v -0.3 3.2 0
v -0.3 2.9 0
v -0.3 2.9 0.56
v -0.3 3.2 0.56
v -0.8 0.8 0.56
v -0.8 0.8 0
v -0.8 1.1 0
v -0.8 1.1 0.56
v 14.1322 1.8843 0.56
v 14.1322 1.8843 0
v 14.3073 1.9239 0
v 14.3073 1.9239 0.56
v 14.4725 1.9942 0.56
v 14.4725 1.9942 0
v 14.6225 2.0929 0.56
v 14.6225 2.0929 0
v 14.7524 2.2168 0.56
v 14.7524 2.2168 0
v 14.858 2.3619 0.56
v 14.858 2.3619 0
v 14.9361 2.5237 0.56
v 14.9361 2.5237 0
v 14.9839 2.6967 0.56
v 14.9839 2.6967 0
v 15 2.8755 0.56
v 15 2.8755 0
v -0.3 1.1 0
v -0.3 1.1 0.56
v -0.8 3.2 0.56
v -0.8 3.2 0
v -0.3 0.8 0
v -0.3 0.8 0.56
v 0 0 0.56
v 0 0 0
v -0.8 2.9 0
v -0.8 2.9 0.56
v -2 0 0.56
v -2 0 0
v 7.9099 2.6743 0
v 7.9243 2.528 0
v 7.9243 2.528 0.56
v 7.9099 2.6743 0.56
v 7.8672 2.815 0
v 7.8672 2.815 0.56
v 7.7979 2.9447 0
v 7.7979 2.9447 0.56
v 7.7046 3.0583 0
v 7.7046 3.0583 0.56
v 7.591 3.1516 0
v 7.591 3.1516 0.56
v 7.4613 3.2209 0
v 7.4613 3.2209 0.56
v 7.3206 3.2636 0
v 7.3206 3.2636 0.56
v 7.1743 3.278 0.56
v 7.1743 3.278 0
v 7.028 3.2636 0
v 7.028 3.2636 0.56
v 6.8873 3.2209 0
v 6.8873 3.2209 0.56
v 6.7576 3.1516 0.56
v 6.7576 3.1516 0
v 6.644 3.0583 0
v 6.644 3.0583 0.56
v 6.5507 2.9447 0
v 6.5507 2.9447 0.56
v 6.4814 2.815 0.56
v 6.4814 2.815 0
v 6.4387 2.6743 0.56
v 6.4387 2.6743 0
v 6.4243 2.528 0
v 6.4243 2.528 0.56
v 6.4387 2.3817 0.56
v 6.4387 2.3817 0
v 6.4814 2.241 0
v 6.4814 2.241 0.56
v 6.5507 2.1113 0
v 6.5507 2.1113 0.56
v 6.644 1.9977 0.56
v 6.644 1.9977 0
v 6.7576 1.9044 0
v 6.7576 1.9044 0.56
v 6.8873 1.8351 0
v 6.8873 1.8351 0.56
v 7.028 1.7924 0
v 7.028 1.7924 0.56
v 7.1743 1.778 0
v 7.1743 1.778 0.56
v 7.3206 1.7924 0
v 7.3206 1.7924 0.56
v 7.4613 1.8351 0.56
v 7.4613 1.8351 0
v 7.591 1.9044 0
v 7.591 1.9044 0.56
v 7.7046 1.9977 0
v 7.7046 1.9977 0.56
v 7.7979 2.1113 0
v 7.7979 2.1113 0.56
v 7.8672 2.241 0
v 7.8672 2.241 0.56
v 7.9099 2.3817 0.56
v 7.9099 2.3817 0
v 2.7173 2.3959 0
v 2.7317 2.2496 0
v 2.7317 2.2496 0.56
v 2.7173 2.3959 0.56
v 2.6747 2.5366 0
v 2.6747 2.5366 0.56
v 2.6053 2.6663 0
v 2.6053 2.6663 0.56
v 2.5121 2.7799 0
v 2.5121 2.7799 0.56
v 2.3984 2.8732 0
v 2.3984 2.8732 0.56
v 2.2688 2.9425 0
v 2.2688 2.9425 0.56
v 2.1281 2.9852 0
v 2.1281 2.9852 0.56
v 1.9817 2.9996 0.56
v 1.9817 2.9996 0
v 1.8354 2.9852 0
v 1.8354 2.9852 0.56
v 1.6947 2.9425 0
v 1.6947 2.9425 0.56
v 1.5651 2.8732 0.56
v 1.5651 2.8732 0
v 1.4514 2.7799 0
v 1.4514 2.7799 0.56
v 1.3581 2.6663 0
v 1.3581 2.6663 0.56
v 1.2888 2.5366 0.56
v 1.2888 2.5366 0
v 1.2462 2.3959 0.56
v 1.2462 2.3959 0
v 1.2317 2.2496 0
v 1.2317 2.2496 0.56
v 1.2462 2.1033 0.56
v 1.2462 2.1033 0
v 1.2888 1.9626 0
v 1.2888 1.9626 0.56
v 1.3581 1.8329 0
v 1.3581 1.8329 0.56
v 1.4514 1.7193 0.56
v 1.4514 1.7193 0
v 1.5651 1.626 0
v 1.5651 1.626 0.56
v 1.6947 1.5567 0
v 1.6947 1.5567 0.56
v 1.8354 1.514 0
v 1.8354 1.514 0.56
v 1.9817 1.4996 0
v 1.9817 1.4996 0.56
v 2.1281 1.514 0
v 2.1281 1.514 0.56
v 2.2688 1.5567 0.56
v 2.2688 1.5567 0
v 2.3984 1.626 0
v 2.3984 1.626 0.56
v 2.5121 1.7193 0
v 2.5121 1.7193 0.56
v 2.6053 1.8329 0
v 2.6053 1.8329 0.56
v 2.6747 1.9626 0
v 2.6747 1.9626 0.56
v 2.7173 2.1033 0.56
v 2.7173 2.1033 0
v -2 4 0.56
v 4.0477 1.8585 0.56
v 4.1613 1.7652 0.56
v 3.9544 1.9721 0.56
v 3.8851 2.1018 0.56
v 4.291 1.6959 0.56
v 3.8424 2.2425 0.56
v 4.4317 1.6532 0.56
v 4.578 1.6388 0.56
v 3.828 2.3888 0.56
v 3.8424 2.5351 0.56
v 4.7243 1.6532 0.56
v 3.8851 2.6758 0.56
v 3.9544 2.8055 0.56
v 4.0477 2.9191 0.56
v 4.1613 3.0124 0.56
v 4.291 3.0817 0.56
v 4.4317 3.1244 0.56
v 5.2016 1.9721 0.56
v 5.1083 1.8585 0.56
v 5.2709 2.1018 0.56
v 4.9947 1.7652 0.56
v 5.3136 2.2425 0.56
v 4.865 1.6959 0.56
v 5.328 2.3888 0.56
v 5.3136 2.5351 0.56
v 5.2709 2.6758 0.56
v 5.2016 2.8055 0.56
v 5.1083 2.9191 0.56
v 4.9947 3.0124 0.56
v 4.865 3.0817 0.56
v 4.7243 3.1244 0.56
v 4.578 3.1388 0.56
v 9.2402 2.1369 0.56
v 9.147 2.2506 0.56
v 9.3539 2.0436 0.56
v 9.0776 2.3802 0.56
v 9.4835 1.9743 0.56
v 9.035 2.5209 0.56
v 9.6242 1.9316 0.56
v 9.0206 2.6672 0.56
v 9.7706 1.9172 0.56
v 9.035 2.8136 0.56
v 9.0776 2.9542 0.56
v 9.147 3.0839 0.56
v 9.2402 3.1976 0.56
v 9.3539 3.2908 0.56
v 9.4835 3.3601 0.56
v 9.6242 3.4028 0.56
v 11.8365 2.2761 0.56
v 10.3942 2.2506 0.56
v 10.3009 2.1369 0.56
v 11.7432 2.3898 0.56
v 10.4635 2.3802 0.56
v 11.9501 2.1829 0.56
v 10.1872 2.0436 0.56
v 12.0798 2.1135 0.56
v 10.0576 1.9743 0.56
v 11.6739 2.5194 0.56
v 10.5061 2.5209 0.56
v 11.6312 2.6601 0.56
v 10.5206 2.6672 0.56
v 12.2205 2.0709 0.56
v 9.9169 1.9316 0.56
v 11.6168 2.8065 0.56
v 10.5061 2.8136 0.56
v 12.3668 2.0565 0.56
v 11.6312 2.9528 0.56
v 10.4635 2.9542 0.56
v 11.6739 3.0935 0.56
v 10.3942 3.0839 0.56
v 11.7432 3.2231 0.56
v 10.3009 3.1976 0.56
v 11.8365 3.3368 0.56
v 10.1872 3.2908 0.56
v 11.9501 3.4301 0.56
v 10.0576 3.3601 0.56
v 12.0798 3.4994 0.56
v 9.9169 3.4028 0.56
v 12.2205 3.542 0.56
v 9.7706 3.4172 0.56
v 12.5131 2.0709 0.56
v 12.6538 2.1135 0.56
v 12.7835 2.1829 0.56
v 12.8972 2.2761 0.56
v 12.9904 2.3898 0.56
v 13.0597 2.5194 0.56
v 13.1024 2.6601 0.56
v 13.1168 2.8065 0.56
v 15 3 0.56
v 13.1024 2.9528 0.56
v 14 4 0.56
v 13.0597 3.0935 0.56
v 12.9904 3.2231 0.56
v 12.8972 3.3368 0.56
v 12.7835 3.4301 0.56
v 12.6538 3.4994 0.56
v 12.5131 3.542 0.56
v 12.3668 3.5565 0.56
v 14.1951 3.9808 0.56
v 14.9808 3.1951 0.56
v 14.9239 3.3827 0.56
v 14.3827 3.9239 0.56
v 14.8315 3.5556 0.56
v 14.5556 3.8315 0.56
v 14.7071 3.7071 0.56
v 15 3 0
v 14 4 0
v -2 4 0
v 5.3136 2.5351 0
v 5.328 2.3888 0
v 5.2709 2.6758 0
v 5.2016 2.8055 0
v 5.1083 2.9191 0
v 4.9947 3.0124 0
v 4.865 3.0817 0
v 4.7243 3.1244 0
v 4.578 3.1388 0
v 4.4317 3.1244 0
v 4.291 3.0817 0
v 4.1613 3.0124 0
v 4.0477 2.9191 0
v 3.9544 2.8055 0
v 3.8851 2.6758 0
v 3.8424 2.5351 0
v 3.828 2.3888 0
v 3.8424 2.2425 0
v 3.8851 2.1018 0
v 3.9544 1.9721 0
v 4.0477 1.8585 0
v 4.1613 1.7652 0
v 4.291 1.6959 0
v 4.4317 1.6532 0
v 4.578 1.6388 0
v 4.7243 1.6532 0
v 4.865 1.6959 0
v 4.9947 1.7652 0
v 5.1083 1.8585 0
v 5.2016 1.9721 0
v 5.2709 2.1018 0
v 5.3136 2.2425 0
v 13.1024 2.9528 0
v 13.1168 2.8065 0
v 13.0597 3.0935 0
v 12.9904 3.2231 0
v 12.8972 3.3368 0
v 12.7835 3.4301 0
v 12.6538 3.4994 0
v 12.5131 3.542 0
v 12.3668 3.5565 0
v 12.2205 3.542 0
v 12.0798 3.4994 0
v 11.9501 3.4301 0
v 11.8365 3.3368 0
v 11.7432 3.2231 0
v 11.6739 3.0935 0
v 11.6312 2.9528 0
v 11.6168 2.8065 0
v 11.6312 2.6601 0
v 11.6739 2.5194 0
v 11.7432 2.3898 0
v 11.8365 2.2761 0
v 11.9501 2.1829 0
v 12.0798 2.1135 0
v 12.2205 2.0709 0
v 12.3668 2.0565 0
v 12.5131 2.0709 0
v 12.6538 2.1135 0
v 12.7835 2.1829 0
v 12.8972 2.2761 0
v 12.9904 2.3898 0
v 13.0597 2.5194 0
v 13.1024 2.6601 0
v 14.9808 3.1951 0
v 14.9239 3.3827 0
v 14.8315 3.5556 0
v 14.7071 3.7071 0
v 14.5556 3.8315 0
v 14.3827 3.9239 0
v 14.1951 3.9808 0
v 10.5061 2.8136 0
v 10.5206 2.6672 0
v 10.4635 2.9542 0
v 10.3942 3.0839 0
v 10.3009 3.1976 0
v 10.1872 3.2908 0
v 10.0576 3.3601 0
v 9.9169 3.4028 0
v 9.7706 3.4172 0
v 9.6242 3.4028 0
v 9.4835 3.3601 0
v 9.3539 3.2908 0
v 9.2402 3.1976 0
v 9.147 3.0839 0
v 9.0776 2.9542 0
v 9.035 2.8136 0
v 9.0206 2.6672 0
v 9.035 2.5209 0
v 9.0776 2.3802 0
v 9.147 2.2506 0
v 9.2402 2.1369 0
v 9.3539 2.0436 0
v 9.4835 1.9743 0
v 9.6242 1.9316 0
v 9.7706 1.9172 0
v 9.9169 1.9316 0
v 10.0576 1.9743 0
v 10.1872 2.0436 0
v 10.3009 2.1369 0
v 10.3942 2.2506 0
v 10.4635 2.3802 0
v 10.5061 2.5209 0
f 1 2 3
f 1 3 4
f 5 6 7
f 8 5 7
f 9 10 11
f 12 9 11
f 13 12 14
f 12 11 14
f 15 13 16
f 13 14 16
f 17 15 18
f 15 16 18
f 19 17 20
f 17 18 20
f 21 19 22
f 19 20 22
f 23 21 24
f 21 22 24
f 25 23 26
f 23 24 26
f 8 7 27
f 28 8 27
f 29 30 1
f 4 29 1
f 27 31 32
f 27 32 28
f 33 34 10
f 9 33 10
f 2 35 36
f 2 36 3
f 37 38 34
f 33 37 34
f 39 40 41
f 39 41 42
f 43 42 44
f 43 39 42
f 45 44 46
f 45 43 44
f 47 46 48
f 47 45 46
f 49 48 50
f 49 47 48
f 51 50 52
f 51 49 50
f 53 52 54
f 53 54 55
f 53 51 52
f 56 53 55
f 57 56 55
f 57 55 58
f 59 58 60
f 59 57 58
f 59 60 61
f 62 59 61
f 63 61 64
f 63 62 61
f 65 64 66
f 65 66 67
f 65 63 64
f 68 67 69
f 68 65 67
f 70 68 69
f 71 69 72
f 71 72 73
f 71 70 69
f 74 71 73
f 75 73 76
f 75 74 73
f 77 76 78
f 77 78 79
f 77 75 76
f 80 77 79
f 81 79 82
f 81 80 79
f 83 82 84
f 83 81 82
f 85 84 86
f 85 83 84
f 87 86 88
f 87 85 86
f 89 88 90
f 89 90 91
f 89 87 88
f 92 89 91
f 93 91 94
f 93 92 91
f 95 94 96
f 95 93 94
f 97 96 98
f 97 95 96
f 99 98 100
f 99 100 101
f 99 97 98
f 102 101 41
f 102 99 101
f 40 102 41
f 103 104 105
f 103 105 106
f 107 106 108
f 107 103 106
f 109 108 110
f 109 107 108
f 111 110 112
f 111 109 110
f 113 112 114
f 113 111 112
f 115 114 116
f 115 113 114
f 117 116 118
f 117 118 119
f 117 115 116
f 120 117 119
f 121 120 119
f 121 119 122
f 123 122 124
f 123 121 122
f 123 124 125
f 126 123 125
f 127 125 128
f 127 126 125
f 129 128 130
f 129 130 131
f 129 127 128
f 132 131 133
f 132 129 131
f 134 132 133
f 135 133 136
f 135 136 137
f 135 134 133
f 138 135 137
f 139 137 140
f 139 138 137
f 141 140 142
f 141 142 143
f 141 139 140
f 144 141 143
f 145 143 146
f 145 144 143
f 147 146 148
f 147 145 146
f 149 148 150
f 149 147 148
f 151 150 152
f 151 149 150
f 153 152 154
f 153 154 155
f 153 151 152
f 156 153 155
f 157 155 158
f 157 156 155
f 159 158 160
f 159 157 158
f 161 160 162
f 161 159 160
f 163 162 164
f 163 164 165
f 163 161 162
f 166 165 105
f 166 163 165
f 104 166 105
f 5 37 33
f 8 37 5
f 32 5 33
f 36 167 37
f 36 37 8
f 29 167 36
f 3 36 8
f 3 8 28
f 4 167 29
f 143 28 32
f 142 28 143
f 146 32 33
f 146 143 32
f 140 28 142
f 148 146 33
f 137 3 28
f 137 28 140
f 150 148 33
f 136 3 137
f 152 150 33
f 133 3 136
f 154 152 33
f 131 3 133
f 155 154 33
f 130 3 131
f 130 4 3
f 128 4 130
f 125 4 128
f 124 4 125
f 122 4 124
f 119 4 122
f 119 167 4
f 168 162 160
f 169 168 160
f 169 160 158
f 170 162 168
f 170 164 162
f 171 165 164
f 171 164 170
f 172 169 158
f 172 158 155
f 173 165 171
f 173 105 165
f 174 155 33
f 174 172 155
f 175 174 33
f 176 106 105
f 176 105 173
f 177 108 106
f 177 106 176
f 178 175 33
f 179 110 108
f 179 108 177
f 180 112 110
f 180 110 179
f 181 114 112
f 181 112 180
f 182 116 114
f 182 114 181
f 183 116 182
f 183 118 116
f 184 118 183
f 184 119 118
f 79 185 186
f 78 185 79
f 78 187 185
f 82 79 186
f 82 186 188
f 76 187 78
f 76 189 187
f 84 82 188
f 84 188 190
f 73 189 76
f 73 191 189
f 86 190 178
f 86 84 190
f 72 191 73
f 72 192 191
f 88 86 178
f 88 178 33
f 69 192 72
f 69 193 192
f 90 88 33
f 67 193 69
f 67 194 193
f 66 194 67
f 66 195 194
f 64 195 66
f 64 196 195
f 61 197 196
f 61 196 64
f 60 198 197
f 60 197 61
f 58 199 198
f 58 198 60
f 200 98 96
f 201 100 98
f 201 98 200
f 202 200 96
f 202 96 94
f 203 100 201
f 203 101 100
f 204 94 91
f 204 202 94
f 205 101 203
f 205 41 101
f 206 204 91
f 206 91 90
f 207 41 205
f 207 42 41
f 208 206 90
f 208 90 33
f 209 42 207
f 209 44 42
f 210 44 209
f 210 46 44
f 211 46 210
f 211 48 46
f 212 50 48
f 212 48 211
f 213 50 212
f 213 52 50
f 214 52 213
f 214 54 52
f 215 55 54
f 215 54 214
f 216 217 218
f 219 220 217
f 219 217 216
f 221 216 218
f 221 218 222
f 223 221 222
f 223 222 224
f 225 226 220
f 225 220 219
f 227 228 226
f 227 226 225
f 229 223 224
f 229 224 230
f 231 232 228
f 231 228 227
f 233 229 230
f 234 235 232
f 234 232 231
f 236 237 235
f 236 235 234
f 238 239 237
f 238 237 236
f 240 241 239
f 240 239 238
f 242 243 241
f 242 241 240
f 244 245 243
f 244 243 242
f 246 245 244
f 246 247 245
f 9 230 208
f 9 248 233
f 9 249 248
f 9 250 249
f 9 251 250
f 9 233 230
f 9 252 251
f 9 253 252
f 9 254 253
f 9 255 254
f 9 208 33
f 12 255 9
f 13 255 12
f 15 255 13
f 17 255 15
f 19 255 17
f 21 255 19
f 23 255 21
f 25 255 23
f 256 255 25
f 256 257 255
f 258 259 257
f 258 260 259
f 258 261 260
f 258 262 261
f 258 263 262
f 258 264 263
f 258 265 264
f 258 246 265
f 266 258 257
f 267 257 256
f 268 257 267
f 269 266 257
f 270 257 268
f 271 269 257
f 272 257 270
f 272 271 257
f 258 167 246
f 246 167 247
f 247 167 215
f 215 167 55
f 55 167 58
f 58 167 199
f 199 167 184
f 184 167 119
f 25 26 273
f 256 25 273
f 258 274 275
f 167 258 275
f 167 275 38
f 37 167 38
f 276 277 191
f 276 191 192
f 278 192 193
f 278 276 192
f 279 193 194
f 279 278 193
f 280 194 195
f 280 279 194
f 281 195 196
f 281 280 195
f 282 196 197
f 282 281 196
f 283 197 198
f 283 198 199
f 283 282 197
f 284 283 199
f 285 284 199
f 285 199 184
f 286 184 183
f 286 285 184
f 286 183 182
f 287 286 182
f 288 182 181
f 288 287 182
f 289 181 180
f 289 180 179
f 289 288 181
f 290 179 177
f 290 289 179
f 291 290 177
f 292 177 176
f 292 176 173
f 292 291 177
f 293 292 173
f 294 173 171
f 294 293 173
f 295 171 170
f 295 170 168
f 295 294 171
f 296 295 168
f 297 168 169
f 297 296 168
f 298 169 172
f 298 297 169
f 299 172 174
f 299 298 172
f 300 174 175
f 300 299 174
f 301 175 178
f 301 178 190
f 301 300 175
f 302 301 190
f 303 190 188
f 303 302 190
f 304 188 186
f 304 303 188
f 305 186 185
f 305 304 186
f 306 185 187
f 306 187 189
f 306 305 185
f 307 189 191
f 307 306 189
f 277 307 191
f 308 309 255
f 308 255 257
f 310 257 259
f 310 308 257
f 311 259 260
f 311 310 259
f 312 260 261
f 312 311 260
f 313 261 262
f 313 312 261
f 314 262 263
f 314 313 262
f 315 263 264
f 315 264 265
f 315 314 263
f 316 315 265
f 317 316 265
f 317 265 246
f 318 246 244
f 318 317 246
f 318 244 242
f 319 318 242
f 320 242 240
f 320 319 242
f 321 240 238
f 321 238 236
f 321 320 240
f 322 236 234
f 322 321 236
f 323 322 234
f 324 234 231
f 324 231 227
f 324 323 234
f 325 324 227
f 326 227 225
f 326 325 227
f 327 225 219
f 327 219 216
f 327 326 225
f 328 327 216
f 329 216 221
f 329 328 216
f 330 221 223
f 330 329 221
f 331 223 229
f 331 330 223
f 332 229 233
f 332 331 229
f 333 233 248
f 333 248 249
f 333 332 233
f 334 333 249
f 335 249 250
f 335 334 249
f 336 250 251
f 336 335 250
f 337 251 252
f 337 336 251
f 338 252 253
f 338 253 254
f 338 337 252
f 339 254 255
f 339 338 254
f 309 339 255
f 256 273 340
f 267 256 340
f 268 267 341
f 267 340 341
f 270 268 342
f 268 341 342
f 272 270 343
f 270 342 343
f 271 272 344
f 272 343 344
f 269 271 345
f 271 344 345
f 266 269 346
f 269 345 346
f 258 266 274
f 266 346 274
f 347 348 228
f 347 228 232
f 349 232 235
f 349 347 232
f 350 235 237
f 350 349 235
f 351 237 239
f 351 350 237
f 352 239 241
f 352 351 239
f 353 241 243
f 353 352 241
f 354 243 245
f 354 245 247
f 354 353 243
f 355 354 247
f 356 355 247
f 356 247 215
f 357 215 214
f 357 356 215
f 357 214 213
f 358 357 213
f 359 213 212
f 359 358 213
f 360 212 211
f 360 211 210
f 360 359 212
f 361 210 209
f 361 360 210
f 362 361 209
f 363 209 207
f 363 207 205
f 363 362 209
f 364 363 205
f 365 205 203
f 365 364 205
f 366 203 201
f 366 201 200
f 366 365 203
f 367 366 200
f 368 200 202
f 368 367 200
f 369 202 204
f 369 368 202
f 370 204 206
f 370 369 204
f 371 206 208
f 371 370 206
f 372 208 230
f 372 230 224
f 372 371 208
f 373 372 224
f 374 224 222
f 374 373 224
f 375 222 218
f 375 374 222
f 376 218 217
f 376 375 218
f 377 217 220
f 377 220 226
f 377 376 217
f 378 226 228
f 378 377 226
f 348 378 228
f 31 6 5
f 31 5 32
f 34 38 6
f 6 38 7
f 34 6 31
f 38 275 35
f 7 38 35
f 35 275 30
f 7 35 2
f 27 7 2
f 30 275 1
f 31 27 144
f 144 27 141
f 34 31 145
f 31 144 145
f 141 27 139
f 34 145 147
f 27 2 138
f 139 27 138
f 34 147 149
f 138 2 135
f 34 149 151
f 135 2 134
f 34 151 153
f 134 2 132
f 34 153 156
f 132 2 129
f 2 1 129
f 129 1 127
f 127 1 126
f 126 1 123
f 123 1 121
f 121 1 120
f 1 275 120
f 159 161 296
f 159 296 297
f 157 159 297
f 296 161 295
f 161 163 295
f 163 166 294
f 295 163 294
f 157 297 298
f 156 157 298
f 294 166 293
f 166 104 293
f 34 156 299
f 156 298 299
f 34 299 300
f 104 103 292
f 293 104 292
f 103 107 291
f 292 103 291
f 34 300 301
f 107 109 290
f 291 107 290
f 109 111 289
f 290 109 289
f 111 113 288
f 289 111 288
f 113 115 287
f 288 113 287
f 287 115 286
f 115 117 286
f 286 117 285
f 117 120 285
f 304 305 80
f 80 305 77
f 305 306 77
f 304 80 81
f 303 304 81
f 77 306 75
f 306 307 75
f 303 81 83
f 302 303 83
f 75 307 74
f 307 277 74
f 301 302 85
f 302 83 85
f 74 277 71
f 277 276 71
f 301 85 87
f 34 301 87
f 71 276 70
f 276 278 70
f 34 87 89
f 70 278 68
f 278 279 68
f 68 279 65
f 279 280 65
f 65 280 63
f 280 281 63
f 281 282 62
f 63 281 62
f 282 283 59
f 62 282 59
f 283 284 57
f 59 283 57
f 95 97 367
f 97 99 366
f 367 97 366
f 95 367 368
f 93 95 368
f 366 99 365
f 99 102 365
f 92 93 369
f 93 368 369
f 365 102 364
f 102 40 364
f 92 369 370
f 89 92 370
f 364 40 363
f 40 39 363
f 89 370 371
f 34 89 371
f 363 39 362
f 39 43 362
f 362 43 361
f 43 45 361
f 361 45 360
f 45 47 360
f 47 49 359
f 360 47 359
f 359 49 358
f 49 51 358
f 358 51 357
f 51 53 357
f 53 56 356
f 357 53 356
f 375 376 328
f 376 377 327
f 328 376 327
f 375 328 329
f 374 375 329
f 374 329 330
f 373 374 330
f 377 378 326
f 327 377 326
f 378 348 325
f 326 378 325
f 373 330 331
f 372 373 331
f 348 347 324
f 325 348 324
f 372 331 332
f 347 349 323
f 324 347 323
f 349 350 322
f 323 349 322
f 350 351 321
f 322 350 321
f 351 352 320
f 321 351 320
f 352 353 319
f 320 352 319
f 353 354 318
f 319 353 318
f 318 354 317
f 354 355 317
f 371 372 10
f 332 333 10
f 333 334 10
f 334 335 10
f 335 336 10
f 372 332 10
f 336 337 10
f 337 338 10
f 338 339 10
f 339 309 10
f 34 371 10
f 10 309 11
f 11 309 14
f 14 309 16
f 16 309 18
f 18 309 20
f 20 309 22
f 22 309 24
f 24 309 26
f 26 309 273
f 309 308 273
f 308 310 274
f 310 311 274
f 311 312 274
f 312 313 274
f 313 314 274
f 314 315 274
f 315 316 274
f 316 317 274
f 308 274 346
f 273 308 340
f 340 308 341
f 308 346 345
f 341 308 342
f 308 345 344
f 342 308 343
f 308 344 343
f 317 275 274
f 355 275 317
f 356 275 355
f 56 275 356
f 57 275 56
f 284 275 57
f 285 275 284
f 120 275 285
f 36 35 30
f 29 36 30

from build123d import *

# Parameters (mm, degrees)
F0_W     = 0.5
F0_H     = 0.3
F0_R     = 0.75
F1_DEPTH = 0.56


with BuildPart() as f1:
    # F0 (on Top) → F1 (new body)
    with BuildSketch(Plane.XY):
        with BuildLine():
            Line((14, 4), (0, 4))
            Line((0, 4), (-2, 4))
            Line((-2, 4), (-2, 0))
            Line((-2, 0), (0, 0))
            Line((0, 0), (14.132164, 1.884288))
            ThreePointArc((14.132164, 1.884288), (14.752384, 2.216792), (15, 2.875516))
            Line((15, 2.875516), (15, 3))
            ThreePointArc((15, 3), (14.707107, 3.707107), (14, 4))
        make_face()
        with Locations((-0.55, 0.95)):
            Rectangle(F0_W, F0_H, mode=Mode.SUBTRACT)
        with Locations((1.981743, 2.249582)):
            Circle(F0_R, mode=Mode.SUBTRACT)
        with Locations((4.578013, 2.3888)):
            Circle(F0_R, mode=Mode.SUBTRACT)
        with Locations((-0.55, 3.05)):
            Rectangle(F0_W, F0_H, mode=Mode.SUBTRACT)
        with Locations((7.174283, 2.528018)):
            Circle(F0_R, mode=Mode.SUBTRACT)
        with Locations((9.770553, 2.667237)):
            Circle(F0_R, mode=Mode.SUBTRACT)
        with Locations((12.366823, 2.806455)):
            Circle(F0_R, mode=Mode.SUBTRACT)
    extrude(amount=F1_DEPTH)


solid = f1.part
